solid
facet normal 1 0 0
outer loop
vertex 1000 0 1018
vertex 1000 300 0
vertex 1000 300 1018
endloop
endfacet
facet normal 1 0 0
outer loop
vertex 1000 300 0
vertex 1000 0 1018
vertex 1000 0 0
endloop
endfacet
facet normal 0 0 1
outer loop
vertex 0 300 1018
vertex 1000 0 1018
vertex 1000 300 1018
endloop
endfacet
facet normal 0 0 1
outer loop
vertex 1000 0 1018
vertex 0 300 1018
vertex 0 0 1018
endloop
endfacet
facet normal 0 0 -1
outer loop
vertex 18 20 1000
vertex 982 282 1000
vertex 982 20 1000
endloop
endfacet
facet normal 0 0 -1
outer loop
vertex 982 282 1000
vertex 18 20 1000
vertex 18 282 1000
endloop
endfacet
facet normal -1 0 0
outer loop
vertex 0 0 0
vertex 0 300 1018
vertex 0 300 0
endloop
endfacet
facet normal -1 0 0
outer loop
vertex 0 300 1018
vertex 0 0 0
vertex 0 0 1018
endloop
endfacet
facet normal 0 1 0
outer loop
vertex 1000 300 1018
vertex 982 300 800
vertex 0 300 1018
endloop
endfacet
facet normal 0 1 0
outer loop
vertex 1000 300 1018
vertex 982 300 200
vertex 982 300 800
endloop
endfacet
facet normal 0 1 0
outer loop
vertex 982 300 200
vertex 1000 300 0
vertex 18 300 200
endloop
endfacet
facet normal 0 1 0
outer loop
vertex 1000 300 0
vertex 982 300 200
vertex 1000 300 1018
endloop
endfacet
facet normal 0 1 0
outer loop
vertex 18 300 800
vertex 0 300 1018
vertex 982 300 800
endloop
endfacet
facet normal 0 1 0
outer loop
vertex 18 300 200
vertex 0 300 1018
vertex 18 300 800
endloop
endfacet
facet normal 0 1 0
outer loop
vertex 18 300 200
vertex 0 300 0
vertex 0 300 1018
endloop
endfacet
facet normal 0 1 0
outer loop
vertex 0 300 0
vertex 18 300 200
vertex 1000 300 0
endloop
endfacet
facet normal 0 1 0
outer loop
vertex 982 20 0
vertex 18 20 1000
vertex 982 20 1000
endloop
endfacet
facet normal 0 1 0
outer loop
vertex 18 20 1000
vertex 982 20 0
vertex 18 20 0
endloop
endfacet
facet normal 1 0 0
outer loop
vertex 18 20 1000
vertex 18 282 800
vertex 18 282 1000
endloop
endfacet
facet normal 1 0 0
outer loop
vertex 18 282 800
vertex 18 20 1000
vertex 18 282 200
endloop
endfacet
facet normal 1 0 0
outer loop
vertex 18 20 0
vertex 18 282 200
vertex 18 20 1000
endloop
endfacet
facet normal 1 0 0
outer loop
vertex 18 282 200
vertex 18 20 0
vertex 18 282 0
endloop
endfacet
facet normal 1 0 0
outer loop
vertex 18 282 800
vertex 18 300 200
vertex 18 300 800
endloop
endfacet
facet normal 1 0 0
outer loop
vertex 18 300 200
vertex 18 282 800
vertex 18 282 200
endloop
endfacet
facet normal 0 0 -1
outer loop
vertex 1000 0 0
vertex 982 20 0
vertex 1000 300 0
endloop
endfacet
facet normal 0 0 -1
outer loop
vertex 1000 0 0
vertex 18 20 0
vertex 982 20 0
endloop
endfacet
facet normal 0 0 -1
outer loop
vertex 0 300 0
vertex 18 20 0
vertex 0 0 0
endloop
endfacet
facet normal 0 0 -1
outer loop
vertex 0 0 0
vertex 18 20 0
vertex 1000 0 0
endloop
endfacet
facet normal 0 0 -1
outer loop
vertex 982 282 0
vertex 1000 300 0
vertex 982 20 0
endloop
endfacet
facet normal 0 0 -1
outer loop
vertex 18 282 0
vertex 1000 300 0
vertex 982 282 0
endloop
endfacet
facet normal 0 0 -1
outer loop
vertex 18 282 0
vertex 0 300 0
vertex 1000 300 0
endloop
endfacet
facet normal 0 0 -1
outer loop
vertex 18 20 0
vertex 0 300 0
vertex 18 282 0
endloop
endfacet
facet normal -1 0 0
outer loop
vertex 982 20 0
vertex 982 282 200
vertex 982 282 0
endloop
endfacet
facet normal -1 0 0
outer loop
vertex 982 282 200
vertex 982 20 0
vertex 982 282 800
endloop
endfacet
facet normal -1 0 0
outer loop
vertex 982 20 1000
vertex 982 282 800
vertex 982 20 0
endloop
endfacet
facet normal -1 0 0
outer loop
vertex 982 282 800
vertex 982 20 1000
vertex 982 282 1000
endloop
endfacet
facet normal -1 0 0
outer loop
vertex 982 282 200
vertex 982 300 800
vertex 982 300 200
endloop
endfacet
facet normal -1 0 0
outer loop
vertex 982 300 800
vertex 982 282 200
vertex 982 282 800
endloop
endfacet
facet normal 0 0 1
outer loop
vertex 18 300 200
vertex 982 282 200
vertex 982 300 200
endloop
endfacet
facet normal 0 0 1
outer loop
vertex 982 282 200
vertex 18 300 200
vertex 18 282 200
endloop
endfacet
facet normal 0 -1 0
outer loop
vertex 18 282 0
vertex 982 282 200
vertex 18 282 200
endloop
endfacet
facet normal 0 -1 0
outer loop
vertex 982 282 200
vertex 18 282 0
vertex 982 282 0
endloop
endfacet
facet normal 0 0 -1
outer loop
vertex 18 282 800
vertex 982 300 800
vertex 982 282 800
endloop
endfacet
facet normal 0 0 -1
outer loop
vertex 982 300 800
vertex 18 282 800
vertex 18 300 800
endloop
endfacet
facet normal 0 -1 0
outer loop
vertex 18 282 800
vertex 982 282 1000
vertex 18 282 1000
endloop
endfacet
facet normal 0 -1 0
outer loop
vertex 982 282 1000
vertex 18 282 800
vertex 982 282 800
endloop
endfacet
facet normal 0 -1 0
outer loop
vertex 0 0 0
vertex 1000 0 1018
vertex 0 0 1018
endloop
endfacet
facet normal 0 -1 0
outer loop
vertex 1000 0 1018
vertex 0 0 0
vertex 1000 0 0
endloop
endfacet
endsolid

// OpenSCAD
// Plank Dimensions
PLANK_LENGTH = 1000;
PLANK_DEPTH = 300;
PLANK_THICKNESS = 18;

// Backpanel Dimensions
DEPTH_BACKPANEL = 20;
COLOR_BACKPANEL = [0.5, 0.2, 0.3, 1];

// Frontpanel Dimensions
HEIGHT_FRONTPANEL = 200;
WIDTH_FRONTPANEL = PLANK_LENGTH - (PLANK_THICKNESS*2);
DEPTH_FRONTPANEL = PLANK_THICKNESS;

// BoundingBox Dimensions
HEIGHT_BBOX = PLANK_LENGTH + PLANK_THICKNESS;
WIDTH_BBOX = PLANK_LENGTH;
DEPTH_BBOX = PLANK_DEPTH;


BBOX_MIDDLE = HEIGHT_BBOX * 0.5 - PLANK_THICKNESS * 0.5;
BBOX_TOP = HEIGHT_BBOX - PLANK_THICKNESS;


module BoundingBox(){
    color("blue", 0.2)
        cube([WIDTH_BBOX, DEPTH_BBOX, HEIGHT_BBOX]);
}

module BackPanel(){
    color(COLOR_BACKPANEL)
        cube([WIDTH_BBOX, DEPTH_BACKPANEL, HEIGHT_BBOX]);
}

module Plank(){
    cube([PLANK_LENGTH - (PLANK_LENGTH - WIDTH_BBOX), DEPTH_BBOX - DEPTH_BACKPANEL, PLANK_THICKNESS]);
}

// Plank - Top
module PlankTop(){
    translate([0,0,HEIGHT_BBOX - PLANK_THICKNESS]){
        Plank();
    }
}

// Plank - Side
module PlankSide(){
    translate([0, 0, 0]){
        cube([PLANK_THICKNESS, DEPTH_BBOX - DEPTH_BACKPANEL, PLANK_LENGTH]);
    }
}

// Plank - FrontPanel
module PlankFrontPanel(){
    translate([PLANK_THICKNESS, PLANK_DEPTH - PLANK_THICKNESS - DEPTH_BACKPANEL, 0]){
        color("green")
            cube([WIDTH_BBOX - PLANK_THICKNESS * 2, PLANK_THICKNESS, HEIGHT_FRONTPANEL]);
    }
}

// BoundingBox();
BackPanel();
translate([0, DEPTH_BACKPANEL, 0]){
    PlankTop();
    PlankSide();
    translate([WIDTH_BBOX - PLANK_THICKNESS, 0, 0]){
        PlankSide();
    }
    PlankFrontPanel();
    translate([0, 0, BBOX_TOP - HEIGHT_FRONTPANEL]){
        PlankFrontPanel();
    }
}
